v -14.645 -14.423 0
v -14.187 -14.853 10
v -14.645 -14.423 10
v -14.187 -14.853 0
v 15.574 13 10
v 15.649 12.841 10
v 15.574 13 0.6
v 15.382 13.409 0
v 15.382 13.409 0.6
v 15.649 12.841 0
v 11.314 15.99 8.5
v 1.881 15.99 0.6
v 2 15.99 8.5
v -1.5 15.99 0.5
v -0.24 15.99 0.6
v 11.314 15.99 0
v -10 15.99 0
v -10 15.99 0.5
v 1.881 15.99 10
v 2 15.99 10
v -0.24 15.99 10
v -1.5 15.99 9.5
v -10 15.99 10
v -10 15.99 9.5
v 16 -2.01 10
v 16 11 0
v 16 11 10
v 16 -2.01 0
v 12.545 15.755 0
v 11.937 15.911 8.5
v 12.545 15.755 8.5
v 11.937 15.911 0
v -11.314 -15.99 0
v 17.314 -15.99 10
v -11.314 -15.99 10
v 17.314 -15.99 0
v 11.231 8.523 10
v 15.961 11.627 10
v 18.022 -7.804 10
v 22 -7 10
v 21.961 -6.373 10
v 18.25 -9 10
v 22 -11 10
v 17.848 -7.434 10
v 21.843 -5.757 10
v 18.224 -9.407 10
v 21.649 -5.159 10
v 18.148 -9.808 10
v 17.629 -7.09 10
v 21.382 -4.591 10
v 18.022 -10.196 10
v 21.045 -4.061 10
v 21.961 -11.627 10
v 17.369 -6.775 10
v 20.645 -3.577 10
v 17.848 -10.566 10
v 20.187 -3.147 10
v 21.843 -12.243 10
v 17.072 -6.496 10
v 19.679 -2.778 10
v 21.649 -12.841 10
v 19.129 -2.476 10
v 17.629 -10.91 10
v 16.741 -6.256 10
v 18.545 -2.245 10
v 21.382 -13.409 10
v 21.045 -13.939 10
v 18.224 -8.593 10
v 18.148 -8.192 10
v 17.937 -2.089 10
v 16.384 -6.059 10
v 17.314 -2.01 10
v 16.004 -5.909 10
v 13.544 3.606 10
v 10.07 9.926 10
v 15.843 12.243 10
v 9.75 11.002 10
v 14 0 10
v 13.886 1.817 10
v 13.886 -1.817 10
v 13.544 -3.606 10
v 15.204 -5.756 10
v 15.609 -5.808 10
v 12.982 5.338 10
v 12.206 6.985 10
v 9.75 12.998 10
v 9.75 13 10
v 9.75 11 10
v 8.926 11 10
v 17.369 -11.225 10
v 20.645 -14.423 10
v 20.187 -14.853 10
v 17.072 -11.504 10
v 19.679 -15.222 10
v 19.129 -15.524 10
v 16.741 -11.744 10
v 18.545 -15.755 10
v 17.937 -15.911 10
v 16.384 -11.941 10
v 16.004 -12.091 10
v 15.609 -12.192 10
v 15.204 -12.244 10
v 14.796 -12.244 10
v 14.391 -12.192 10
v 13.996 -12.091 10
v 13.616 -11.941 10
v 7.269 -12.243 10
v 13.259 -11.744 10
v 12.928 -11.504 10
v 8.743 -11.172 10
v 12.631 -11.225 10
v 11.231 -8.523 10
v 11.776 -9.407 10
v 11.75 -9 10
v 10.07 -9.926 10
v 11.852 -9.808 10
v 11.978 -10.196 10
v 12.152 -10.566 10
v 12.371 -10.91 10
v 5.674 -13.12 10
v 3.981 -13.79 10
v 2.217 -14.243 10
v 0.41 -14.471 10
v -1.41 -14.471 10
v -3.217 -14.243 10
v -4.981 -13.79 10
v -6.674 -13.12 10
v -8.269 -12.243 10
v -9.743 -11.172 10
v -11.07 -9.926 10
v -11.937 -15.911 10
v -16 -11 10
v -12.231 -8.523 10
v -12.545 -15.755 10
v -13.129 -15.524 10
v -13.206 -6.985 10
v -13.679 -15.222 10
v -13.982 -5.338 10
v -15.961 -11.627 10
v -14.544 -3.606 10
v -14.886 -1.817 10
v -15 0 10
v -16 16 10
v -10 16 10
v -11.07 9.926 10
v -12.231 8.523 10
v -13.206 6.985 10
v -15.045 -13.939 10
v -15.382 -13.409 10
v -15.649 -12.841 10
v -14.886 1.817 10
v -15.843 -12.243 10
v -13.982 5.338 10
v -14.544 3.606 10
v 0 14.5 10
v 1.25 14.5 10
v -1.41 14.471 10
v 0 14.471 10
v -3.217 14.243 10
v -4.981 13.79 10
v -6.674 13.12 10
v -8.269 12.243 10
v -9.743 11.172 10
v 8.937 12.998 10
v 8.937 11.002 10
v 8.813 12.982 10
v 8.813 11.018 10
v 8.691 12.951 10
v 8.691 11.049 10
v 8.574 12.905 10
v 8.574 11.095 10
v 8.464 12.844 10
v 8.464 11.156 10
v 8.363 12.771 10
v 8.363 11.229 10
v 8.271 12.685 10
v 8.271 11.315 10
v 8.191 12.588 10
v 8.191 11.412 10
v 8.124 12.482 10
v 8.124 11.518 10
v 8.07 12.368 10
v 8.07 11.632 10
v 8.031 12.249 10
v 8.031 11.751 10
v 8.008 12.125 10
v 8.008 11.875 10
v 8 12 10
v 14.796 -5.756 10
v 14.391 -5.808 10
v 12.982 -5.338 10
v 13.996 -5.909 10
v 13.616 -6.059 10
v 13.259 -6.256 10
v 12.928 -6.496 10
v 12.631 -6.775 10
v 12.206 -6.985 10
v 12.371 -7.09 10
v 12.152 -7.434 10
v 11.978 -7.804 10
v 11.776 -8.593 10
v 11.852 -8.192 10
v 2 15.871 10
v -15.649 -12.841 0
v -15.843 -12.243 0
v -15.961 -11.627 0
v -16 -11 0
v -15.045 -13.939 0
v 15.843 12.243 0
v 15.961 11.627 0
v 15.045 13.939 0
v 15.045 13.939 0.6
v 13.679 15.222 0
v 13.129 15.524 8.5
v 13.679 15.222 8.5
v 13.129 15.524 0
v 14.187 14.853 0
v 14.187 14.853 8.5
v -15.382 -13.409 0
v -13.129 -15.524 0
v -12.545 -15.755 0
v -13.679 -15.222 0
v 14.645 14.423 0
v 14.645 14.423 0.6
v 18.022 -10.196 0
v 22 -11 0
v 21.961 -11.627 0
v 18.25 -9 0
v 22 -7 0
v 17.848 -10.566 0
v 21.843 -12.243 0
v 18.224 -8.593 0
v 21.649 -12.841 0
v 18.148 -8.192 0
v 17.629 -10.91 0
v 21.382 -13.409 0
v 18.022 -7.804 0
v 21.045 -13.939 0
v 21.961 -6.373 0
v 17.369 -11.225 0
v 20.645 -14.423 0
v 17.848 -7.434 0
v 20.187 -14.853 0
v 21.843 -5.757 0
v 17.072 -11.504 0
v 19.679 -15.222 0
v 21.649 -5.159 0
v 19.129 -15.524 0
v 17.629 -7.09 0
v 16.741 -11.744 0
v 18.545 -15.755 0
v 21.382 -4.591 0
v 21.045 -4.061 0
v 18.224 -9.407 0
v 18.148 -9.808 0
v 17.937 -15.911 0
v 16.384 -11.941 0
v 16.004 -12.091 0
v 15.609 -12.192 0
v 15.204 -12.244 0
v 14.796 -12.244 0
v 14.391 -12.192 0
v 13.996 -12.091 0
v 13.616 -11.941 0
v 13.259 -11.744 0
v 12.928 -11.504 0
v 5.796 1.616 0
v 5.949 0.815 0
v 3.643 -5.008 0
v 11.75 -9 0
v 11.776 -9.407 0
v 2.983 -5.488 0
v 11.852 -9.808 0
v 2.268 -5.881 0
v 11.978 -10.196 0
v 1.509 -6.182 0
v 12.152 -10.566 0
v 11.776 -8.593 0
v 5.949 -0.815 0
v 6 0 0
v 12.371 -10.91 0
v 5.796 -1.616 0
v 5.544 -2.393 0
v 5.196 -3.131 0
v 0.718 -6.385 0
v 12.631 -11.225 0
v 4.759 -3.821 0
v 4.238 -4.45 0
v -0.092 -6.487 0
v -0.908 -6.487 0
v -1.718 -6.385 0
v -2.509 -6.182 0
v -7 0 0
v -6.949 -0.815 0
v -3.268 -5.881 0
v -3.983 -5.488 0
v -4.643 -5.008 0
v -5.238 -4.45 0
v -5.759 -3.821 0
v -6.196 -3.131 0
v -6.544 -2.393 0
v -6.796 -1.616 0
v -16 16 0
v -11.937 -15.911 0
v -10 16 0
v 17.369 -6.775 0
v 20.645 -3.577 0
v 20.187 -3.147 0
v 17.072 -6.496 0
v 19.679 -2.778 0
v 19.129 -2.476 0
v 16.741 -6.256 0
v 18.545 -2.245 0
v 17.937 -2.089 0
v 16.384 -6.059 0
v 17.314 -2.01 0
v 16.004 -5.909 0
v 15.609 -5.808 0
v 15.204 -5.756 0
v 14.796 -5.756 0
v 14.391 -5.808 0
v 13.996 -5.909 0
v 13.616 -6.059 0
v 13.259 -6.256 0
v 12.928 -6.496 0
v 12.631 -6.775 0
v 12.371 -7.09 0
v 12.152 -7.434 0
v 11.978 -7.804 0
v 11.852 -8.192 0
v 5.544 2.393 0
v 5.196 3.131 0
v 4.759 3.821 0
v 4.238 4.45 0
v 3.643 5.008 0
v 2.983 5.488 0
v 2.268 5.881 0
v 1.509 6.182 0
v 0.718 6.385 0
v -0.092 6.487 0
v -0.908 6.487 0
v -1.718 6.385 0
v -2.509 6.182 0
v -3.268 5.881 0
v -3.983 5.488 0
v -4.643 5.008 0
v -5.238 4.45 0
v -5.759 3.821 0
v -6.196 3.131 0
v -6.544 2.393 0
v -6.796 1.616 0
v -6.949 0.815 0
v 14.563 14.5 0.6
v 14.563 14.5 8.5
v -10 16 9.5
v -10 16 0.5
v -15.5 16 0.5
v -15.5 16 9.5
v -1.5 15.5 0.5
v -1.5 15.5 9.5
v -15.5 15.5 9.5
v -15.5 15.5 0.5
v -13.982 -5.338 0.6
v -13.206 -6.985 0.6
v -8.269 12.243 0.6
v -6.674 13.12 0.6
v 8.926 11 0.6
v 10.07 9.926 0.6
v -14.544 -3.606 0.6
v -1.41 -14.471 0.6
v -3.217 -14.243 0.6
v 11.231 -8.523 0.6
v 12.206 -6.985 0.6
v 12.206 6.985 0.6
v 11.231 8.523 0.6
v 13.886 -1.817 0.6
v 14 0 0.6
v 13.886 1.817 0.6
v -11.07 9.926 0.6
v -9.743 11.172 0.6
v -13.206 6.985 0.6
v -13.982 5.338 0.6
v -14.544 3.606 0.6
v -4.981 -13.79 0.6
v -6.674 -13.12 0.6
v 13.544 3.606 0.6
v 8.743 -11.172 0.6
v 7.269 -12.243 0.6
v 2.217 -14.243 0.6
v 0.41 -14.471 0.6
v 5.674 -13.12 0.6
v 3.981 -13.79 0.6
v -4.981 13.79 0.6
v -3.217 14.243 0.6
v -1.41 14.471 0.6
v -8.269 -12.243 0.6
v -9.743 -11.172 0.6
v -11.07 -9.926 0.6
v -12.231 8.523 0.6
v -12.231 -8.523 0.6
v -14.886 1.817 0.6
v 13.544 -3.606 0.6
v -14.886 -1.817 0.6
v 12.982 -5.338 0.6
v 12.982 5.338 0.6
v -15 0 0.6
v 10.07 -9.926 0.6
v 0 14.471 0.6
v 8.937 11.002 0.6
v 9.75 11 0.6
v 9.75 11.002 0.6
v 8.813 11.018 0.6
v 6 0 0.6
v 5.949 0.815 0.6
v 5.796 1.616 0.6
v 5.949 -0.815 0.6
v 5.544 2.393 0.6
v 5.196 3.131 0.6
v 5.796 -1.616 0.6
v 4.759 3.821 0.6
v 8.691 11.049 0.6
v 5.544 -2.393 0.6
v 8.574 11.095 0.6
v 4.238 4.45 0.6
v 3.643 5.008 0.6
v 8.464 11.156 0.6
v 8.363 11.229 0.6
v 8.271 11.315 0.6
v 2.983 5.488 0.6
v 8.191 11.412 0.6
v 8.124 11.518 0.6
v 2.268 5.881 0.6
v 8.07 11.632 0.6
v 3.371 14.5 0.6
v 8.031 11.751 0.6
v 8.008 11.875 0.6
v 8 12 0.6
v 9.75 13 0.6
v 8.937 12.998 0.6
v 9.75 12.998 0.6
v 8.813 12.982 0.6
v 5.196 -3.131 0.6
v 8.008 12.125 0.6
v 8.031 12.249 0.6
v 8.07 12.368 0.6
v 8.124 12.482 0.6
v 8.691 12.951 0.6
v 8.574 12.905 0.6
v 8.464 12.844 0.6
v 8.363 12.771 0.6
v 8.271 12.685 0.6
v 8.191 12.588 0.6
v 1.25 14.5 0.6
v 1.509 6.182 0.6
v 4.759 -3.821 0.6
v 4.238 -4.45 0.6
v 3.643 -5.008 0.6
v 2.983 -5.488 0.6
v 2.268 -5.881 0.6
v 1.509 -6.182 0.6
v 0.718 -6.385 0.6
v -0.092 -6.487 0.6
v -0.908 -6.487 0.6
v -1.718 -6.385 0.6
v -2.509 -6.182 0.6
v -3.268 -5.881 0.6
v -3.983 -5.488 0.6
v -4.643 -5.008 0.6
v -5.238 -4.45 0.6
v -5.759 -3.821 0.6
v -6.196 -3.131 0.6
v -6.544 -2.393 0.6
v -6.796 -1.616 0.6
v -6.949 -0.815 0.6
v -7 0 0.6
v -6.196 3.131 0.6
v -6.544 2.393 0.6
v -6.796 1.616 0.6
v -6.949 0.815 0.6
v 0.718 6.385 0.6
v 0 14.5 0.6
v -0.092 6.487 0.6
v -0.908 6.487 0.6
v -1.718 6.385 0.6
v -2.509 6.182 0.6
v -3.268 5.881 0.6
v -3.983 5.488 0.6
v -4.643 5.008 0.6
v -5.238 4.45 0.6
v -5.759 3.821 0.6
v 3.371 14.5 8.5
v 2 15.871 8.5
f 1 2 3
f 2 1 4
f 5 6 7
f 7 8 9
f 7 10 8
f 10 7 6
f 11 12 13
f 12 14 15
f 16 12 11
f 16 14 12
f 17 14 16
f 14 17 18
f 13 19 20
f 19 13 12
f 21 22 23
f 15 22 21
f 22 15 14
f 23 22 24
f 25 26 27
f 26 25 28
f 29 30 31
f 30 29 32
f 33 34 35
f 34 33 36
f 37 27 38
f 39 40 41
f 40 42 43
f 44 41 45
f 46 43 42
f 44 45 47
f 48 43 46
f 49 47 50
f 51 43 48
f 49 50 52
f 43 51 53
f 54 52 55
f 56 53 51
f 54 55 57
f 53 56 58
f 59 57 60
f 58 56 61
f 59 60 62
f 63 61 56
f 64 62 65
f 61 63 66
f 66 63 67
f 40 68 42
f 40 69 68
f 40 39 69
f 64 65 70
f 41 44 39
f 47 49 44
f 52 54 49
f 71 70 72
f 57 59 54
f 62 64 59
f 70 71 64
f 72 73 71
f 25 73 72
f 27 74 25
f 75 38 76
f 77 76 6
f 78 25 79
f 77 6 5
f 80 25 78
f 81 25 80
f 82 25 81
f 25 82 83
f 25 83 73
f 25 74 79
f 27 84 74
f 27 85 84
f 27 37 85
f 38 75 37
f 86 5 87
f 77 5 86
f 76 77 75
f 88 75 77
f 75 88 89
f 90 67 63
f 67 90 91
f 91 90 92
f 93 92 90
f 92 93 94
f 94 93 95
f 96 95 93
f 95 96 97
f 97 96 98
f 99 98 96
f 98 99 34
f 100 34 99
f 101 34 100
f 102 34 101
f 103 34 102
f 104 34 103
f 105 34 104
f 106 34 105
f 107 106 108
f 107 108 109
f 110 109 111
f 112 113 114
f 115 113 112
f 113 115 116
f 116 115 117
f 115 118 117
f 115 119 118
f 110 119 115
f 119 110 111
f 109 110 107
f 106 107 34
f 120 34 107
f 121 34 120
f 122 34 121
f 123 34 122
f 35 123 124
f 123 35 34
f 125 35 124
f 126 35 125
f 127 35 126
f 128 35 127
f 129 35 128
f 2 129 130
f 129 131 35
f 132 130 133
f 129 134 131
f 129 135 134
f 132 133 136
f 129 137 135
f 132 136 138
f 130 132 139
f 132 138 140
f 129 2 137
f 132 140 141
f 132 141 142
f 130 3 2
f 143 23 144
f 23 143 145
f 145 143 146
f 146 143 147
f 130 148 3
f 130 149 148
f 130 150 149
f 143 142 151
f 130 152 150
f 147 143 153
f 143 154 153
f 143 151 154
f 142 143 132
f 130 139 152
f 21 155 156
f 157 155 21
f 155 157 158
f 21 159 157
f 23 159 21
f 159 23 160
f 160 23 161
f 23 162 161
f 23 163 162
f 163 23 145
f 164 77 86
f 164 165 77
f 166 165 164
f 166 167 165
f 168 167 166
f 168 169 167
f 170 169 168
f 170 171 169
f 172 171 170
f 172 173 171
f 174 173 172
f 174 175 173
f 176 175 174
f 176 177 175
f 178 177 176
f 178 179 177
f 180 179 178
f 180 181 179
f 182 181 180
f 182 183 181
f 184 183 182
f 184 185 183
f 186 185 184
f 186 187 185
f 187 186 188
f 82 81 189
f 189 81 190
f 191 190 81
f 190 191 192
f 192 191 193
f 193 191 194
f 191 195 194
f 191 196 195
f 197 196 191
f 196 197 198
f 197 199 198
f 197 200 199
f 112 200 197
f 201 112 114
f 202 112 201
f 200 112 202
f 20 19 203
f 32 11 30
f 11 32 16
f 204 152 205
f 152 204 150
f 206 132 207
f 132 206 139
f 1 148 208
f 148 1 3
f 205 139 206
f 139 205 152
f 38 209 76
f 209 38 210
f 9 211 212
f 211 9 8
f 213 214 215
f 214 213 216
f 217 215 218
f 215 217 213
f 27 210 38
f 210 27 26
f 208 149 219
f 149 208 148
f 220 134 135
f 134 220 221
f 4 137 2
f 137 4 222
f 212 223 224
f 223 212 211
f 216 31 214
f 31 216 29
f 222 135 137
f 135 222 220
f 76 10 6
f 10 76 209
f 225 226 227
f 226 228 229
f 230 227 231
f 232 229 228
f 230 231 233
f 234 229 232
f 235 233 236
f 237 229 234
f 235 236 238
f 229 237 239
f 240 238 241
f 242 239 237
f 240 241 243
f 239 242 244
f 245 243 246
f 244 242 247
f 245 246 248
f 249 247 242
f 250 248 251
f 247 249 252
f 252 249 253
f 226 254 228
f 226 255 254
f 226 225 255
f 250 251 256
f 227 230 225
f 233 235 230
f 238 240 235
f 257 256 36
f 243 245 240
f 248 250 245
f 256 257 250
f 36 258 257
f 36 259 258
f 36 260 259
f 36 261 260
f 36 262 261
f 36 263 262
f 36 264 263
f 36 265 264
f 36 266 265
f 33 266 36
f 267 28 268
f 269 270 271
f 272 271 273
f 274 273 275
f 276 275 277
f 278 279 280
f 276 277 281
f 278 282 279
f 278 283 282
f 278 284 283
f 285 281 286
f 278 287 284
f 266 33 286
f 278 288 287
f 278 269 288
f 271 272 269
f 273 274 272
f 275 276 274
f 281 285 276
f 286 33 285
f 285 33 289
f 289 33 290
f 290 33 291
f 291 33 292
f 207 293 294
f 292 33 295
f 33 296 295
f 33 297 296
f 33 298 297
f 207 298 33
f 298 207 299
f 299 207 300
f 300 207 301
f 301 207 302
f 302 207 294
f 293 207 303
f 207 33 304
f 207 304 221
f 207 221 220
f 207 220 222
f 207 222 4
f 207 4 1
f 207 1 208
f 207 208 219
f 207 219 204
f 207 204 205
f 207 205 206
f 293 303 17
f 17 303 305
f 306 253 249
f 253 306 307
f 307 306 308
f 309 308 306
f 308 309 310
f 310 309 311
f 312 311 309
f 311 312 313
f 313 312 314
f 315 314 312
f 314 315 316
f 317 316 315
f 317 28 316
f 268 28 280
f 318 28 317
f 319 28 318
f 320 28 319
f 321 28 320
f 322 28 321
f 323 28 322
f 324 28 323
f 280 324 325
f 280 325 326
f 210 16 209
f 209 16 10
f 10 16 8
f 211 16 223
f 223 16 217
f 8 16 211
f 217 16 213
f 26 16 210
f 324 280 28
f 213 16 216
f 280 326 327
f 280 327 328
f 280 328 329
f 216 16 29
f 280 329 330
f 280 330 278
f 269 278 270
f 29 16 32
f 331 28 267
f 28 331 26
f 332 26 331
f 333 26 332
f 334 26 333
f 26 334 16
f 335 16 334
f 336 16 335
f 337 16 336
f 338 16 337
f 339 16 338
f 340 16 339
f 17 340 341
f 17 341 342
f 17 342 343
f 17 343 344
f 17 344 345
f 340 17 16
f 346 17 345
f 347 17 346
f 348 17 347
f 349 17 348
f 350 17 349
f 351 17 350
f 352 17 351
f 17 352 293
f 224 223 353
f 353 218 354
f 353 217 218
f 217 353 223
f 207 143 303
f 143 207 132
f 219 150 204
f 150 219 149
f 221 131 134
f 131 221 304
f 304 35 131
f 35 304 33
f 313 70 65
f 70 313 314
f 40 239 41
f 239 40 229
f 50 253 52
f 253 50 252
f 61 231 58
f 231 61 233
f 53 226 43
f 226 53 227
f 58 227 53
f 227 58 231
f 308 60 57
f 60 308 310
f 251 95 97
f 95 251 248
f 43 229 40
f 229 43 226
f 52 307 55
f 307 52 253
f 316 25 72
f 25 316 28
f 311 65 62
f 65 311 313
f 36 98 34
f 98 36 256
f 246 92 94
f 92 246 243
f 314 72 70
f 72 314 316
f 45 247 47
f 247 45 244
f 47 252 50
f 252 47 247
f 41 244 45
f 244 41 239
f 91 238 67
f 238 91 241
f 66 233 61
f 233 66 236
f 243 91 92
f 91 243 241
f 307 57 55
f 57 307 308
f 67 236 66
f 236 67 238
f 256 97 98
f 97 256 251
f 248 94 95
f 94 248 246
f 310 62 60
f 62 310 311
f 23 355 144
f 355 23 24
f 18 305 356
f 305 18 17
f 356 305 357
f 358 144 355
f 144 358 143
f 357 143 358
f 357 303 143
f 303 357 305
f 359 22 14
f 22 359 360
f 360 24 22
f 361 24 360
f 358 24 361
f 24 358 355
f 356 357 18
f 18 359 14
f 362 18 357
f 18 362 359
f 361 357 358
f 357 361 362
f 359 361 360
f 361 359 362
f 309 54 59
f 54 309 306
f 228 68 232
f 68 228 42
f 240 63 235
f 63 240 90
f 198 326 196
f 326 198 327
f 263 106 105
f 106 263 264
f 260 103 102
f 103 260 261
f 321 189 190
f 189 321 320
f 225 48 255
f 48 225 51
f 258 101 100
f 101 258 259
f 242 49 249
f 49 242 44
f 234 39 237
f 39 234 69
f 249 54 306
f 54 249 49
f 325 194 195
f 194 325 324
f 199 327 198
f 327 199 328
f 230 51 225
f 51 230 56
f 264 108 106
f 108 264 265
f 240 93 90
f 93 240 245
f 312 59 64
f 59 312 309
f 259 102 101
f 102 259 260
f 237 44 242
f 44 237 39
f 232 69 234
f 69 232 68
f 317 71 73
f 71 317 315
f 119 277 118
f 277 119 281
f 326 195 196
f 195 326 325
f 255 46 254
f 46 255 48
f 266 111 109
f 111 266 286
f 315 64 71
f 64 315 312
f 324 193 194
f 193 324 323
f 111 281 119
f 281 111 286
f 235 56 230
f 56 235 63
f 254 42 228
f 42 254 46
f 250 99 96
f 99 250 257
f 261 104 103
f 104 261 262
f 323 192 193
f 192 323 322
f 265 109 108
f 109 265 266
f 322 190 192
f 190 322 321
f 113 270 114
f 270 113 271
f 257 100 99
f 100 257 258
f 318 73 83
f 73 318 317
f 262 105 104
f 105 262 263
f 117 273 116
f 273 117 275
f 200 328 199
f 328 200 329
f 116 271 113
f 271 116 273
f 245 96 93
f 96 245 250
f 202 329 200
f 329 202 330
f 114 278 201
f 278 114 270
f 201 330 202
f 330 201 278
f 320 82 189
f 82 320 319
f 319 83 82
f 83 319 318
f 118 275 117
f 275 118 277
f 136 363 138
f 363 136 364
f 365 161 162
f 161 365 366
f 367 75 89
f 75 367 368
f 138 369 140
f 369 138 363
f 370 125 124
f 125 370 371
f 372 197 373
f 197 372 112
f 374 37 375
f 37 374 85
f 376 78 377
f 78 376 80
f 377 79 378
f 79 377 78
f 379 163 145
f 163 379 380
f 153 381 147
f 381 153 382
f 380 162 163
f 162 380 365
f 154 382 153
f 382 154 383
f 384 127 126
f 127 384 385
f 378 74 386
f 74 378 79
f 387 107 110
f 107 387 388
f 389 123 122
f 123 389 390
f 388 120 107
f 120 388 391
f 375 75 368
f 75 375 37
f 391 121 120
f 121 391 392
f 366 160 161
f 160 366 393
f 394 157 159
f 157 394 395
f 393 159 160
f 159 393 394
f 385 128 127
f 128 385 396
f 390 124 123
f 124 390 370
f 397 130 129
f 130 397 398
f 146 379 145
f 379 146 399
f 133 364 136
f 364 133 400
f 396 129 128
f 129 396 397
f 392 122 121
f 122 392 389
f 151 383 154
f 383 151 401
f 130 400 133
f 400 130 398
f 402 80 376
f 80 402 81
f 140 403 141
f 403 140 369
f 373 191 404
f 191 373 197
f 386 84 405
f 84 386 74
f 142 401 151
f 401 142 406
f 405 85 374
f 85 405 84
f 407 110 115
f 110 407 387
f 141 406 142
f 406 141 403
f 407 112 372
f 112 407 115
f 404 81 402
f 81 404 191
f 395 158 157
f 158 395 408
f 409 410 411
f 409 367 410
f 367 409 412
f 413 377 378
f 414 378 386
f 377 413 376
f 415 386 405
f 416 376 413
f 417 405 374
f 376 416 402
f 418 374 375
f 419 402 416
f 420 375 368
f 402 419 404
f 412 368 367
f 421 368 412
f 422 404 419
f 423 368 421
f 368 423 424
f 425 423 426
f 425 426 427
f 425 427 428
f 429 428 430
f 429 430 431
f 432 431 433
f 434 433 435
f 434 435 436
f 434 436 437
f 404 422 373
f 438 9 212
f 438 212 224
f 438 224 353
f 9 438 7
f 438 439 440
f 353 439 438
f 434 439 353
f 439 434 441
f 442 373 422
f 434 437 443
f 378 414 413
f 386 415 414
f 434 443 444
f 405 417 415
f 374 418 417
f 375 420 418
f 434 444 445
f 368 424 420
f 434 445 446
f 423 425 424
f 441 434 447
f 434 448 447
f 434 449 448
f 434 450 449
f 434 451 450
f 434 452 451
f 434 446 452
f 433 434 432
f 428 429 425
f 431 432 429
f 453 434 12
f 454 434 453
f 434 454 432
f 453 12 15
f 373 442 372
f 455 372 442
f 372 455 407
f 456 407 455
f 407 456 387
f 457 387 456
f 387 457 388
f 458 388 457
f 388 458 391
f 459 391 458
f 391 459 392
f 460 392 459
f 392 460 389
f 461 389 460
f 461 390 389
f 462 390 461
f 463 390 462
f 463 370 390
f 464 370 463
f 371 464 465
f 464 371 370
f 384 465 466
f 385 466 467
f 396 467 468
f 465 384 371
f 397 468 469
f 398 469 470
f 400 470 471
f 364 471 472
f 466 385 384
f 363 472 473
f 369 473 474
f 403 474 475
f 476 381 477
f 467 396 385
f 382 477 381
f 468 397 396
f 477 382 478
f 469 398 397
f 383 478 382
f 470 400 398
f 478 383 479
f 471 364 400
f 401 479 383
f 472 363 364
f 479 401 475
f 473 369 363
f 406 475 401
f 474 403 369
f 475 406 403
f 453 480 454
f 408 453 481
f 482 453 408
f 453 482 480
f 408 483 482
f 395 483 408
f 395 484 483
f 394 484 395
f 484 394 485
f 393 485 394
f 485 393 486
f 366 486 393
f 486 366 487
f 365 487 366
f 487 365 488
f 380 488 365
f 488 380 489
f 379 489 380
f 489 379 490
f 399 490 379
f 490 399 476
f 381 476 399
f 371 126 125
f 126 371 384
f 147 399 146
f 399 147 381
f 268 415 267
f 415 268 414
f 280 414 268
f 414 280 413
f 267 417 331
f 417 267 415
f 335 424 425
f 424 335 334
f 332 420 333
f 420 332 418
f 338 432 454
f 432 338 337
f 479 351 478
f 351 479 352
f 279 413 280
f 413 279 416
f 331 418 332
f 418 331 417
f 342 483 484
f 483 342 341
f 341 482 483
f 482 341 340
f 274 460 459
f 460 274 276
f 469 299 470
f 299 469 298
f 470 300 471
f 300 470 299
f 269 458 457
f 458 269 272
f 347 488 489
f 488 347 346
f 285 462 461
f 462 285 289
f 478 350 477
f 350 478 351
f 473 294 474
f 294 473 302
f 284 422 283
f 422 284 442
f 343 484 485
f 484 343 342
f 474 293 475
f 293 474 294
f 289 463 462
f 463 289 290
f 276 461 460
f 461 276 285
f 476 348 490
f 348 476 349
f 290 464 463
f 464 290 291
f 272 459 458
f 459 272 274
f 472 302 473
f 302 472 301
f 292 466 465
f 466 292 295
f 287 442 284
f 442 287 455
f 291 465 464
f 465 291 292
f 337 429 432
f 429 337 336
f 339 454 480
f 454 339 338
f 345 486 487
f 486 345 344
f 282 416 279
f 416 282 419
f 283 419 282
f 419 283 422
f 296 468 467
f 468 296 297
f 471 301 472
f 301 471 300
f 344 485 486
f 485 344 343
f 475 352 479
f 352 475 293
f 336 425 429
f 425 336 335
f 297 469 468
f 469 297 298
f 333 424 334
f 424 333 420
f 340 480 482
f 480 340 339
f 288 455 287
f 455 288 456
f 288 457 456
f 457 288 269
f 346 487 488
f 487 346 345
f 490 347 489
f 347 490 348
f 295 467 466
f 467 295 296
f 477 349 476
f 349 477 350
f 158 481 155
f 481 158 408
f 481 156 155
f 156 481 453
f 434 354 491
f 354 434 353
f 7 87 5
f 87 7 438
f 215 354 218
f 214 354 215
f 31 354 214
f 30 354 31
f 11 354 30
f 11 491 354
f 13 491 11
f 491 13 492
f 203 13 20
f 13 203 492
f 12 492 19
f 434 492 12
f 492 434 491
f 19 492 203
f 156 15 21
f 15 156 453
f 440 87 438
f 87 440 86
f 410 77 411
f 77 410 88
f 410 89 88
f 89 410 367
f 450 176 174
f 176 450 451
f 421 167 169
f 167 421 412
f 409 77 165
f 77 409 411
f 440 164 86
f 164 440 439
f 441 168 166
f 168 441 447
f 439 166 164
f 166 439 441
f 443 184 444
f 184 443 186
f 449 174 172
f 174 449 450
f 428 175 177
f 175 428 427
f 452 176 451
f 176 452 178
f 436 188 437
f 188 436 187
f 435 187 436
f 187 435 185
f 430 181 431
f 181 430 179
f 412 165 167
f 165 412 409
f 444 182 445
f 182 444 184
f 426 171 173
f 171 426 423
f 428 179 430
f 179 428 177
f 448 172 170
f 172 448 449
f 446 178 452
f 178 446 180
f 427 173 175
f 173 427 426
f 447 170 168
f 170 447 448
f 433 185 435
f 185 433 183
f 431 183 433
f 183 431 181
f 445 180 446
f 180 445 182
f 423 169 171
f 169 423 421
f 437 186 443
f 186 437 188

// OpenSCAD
$fn = 50;


union() {
	difference() {
		union() {
			translate(v = [0, 0, 0]) {
				rotate(a = [0, 0, 0]) {
					hull() {
						translate(v = [-11.0000000000, 11.0000000000, 0]) {
							rotate(a = [0, 0, 0]) {
								translate(v = [0, 0, 0]) {
									rotate(a = [0, 0, 0]) {
										cylinder(h = 10, r = 5);
									}
								}
							}
						}
						translate(v = [11.0000000000, 11.0000000000, 0]) {
							rotate(a = [0, 0, 0]) {
								translate(v = [0, 0, 0]) {
									rotate(a = [0, 0, 0]) {
										cylinder(h = 10, r = 5);
									}
								}
							}
						}
						translate(v = [-11.0000000000, -11.0000000000, 0]) {
							rotate(a = [0, 0, 0]) {
								translate(v = [0, 0, 0]) {
									rotate(a = [0, 0, 0]) {
										cylinder(h = 10, r = 5);
									}
								}
							}
						}
						translate(v = [11.0000000000, -11.0000000000, 0]) {
							rotate(a = [0, 0, 0]) {
								translate(v = [0, 0, 0]) {
									rotate(a = [0, 0, 0]) {
										cylinder(h = 10, r = 5);
									}
								}
							}
						}
					}
				}
			}
			translate(v = [7.5000000000, -9.0000000000, 0]) {
				rotate(a = [0, 0, 0]) {
					hull() {
						translate(v = [-9.5000000000, 2.0000000000, 0]) {
							rotate(a = [0, 0, 0]) {
								translate(v = [0, 0, 0]) {
									rotate(a = [0, 0, 0]) {
										cylinder(h = 10, r = 5);
									}
								}
							}
						}
						translate(v = [9.5000000000, 2.0000000000, 0]) {
							rotate(a = [0, 0, 0]) {
								translate(v = [0, 0, 0]) {
									rotate(a = [0, 0, 0]) {
										cylinder(h = 10, r = 5);
									}
								}
							}
						}
						translate(v = [-9.5000000000, -2.0000000000, 0]) {
							rotate(a = [0, 0, 0]) {
								translate(v = [0, 0, 0]) {
									rotate(a = [0, 0, 0]) {
										cylinder(h = 10, r = 5);
									}
								}
							}
						}
						translate(v = [9.5000000000, -2.0000000000, 0]) {
							rotate(a = [0, 0, 0]) {
								translate(v = [0, 0, 0]) {
									rotate(a = [0, 0, 0]) {
										cylinder(h = 10, r = 5);
									}
								}
							}
						}
					}
				}
			}
			translate(v = [-16.0000000000, 10.0000000000, 0]) {
				rotate(a = [0, 0, 0]) {
					cube(size = [6, 6, 10]);
				}
			}
		}
		union() {
			translate(v = [-15.5000000000, 15.5000000000, 0.5000000000]) {
				rotate(a = [0, 0, 0]) {
					cube(size = [14, 0.5000000000, 9.0000000000]);
				}
			}
			translate(v = [15.0000000000, -9.0000000000, -125.0000000000]) {
				rotate(a = [0, 0, 0]) {
					cylinder(h = 250, r = 3.2500000000);
				}
			}
			translate(v = [-0.5000000000, 0.0000000000, 0.6000000000]) {
				rotate(a = [0, 0, 0]) {
					cylinder(h = 12.4000000000, r = 14.5000000000);
				}
			}
			translate(v = [-0.5000000000, 0.0000000000, -5.0000000000]) {
				rotate(a = [0, 0, 0]) {
					cylinder(h = 10, r = 6.5000000000);
				}
			}
			translate(v = [0.0000000000, 13.0000000000, 0.6000000000]) {
				rotate(a = [0, 0, 0]) {
					cube(size = [16.0000000000, 1.5000000000, 12.4000000000]);
				}
			}
			translate(v = [2.0000000000, 13.0000000000, 8.5000000000]) {
				rotate(a = [0, 0, 0]) {
					cube(size = [14.0000000000, 4.5000000000, 1.5000000000]);
				}
			}
			translate(v = [-3.0000000000, 18.7500000000, 0.6000000000]) {
				rotate(a = [0, 0, -45]) {
					cube(size = [10, 1.5000000000, 12.4000000000]);
				}
			}
			translate(v = [2.2500000000, 11.0000000000, 0.6000000000]) {
				rotate(a = [0, 0, 0]) {
					cube(size = [7.5000000000, 2, 9.4000000000]);
				}
			}
		}
	}
	union() {
		translate(v = [11.5000000000, 12, 0]) {
			rotate(a = [0, 0, 0]) {
				hull() {
					translate(v = [2.5000000000, 0, 0]) {
						rotate(a = [0, 0, 0]) {
							translate(v = [0, 0, 0]) {
								rotate(a = [0, 0, 0]) {
									cylinder(h = 10, r = 1.0000000000);
								}
							}
						}
					}
					translate(v = [-2.5000000000, 0, 0]) {
						rotate(a = [0, 0, 0]) {
							translate(v = [0, 0, 0]) {
								rotate(a = [0, 0, 0]) {
									cylinder(h = 10, r = 1.0000000000);
								}
							}
						}
					}
				}
			}
		}
	}
}
